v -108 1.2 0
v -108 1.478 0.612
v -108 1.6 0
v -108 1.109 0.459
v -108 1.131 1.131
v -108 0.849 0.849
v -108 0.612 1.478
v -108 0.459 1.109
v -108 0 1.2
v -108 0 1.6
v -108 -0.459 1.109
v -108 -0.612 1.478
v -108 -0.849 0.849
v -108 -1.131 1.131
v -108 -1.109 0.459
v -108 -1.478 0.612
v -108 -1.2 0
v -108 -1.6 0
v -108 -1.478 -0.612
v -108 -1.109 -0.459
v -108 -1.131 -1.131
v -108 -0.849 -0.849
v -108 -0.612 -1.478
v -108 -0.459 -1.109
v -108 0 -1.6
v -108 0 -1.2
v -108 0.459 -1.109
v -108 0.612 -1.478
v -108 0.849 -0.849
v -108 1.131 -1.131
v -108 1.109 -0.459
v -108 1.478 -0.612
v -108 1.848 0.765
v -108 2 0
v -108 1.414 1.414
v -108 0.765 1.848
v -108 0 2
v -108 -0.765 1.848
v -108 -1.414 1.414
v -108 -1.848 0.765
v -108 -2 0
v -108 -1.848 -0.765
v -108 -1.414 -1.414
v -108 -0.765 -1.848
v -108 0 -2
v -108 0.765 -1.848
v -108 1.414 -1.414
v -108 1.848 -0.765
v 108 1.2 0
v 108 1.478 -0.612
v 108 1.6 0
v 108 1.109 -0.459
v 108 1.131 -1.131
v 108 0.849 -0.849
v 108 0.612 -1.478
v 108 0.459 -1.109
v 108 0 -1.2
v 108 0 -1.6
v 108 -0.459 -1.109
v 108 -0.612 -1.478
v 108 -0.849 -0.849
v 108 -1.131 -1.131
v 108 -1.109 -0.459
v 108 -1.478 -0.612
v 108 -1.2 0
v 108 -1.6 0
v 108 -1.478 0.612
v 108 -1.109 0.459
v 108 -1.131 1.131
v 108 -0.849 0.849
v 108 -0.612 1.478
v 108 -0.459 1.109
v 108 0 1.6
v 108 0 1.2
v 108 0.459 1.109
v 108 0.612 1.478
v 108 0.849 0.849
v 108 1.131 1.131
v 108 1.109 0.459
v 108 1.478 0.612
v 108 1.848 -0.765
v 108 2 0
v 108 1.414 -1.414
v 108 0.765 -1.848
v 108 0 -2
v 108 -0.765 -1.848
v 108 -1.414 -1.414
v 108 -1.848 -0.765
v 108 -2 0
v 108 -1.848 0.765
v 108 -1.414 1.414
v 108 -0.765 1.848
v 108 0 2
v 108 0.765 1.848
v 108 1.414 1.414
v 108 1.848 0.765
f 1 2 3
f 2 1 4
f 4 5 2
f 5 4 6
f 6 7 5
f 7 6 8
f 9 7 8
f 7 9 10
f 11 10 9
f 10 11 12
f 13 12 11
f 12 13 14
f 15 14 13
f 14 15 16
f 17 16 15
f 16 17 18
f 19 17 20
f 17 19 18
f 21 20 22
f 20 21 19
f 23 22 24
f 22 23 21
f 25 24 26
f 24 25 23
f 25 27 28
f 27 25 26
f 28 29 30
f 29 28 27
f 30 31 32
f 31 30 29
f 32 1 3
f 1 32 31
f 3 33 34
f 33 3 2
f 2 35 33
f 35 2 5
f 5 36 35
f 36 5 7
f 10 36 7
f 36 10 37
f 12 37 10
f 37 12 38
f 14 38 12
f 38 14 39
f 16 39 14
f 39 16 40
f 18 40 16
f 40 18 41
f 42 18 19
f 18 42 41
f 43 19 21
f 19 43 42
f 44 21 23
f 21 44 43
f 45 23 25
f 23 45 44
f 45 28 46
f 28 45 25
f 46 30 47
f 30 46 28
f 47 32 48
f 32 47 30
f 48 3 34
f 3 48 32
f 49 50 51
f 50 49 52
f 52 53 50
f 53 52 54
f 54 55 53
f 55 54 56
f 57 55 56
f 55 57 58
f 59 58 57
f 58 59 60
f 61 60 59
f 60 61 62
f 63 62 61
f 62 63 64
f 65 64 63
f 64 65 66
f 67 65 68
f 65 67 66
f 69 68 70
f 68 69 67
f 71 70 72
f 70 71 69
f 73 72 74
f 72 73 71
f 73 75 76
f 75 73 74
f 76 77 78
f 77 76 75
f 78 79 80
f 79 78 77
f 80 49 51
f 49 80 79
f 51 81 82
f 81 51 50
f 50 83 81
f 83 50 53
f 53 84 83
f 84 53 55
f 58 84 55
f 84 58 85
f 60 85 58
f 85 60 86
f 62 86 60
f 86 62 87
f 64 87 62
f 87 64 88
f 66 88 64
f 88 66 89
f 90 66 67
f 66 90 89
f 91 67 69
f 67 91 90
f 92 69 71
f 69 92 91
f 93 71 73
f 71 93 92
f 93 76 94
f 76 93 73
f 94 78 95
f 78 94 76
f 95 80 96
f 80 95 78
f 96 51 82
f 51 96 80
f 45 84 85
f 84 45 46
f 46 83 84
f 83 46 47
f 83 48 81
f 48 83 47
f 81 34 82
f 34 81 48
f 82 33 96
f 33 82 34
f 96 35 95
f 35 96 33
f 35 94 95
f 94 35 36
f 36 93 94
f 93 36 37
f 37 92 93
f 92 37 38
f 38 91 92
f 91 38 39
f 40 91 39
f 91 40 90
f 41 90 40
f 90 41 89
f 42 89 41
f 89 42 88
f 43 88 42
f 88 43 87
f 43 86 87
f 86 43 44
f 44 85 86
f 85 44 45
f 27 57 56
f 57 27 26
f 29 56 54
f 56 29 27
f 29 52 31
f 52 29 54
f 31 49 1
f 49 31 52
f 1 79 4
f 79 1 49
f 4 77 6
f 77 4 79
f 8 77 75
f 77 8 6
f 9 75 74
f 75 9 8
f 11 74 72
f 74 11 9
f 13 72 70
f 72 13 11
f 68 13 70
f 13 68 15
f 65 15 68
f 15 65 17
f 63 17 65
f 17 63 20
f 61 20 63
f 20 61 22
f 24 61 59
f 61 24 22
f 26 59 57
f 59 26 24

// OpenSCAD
// file: ../p/4-4cyli.scad
use <../lib.scad>
function ldraw_lib__4_4cyli() = [
// 0 Cylinder 1.0
// 0 Name: 4-4cyli.dat
// 0 Author: James Jessiman
// 0 !LDRAW_ORG Primitive UPDATE 2005-01
// 0 !LICENSE Licensed under CC BY 2.0 and CC BY 4.0 : see CAreadme.txt
// 
// 0 BFC CERTIFY CCW
  [0,"BFC","CERTIFY"],
  [0,"BFC","CCW"],
// 
// 0 !HISTORY 1998-12-15 [PTadmin] Official Update 1998-10
// 0 !HISTORY 2002-03-23 [sbliss] Added BFC statement; merged headers from files in distributions LDraw 0.27 and Complete.
// 0 !HISTORY 2002-04-25 [PTadmin] Official Update 2002-02
// 0 !HISTORY 2004-12-14 [guyvivan] BFC CCW
// 0 !HISTORY 2005-12-28 [PTadmin] Official Update 2005-01
// 0 !HISTORY 2007-06-24 [PTadmin] Header formatted for Contributor Agreement
// 0 !HISTORY 2008-07-01 [PTadmin] Official Update 2008-01
// 
// 
// 4 16 1 1 0 0.9239 1 0.3827 0.9239 0 0.3827 1 0 0
  [4,16,1,1,0,0.9239,1,0.3827,0.9239,0,0.3827,1,0,0],
// 5 24 1 0 0 1 1 0 0.9239 0 0.3827 0.9239 0 -0.3827
  [5,24,1,0,0,1,1,0,0.9239,0,0.3827,0.9239,0,-0.3827],
// 4 16 0.9239 1 0.3827 0.7071 1 0.7071 0.7071 0 0.7071 0.9239 0 0.3827
  [4,16,0.9239,1,0.3827,0.7071,1,0.7071,0.7071,0,0.7071,0.9239,0,0.3827],
// 5 24 0.9239 0 0.3827 0.9239 1 0.3827 0.7071 0 0.7071 1 0 0
  [5,24,0.9239,0,0.3827,0.9239,1,0.3827,0.7071,0,0.7071,1,0,0],
// 4 16 0.7071 1 0.7071 0.3827 1 0.9239 0.3827 0 0.9239 0.7071 0 0.7071
  [4,16,0.7071,1,0.7071,0.3827,1,0.9239,0.3827,0,0.9239,0.7071,0,0.7071],
// 5 24 0.7071 0 0.7071 0.7071 1 0.7071 0.3827 0 0.9239 0.9239 0 0.3827
  [5,24,0.7071,0,0.7071,0.7071,1,0.7071,0.3827,0,0.9239,0.9239,0,0.3827],
// 4 16 0.3827 1 0.9239 0 1 1 0 0 1 0.3827 0 0.9239
  [4,16,0.3827,1,0.9239,0,1,1,0,0,1,0.3827,0,0.9239],
// 5 24 0.3827 0 0.9239 0.3827 1 0.9239 0 0 1 0.7071 0 0.7071
  [5,24,0.3827,0,0.9239,0.3827,1,0.9239,0,0,1,0.7071,0,0.7071],
// 4 16 0 1 1 -0.3827 1 0.9239 -0.3827 0 0.9239 0 0 1
  [4,16,0,1,1,-0.3827,1,0.9239,-0.3827,0,0.9239,0,0,1],
// 5 24 0 0 1 0 1 1 -0.3827 0 0.9239 0.3827 0 0.9239
  [5,24,0,0,1,0,1,1,-0.3827,0,0.9239,0.3827,0,0.9239],
// 4 16 -0.3827 1 0.9239 -0.7071 1 0.7071 -0.7071 0 0.7071 -0.3827 0 0.9239
  [4,16,-0.3827,1,0.9239,-0.7071,1,0.7071,-0.7071,0,0.7071,-0.3827,0,0.9239],
// 5 24 -0.3827 0 0.9239 -0.3827 1 0.9239 -0.7071 0 0.7071 0 0 1
  [5,24,-0.3827,0,0.9239,-0.3827,1,0.9239,-0.7071,0,0.7071,0,0,1],
// 4 16 -0.7071 1 0.7071 -0.9239 1 0.3827 -0.9239 0 0.3827 -0.7071 0 0.7071
  [4,16,-0.7071,1,0.7071,-0.9239,1,0.3827,-0.9239,0,0.3827,-0.7071,0,0.7071],
// 5 24 -0.7071 0 0.7071 -0.7071 1 0.7071 -0.9239 0 0.3827 -0.3827 0 0.9239
  [5,24,-0.7071,0,0.7071,-0.7071,1,0.7071,-0.9239,0,0.3827,-0.3827,0,0.9239],
// 4 16 -0.9239 1 0.3827 -1 1 0 -1 0 0 -0.9239 0 0.3827
  [4,16,-0.9239,1,0.3827,-1,1,0,-1,0,0,-0.9239,0,0.3827],
// 5 24 -0.9239 0 0.3827 -0.9239 1 0.3827 -1 0 0 -0.7071 0 0.7071
  [5,24,-0.9239,0,0.3827,-0.9239,1,0.3827,-1,0,0,-0.7071,0,0.7071],
// 4 16 -1 1 0 -0.9239 1 -0.3827 -0.9239 0 -0.3827 -1 0 0
  [4,16,-1,1,0,-0.9239,1,-0.3827,-0.9239,0,-0.3827,-1,0,0],
// 5 24 -1 0 0 -1 1 0 -0.9239 0 -0.3827 -0.9239 0 0.3827
  [5,24,-1,0,0,-1,1,0,-0.9239,0,-0.3827,-0.9239,0,0.3827],
// 4 16 -0.9239 1 -0.3827 -0.7071 1 -0.7071 -0.7071 0 -0.7071 -0.9239 0 -0.3827
  [4,16,-0.9239,1,-0.3827,-0.7071,1,-0.7071,-0.7071,0,-0.7071,-0.9239,0,-0.3827],
// 5 24 -0.9239 0 -0.3827 -0.9239 1 -0.3827 -0.7071 0 -0.7071 -1 0 0
  [5,24,-0.9239,0,-0.3827,-0.9239,1,-0.3827,-0.7071,0,-0.7071,-1,0,0],
// 4 16 -0.7071 1 -0.7071 -0.3827 1 -0.9239 -0.3827 0 -0.9239 -0.7071 0 -0.7071
  [4,16,-0.7071,1,-0.7071,-0.3827,1,-0.9239,-0.3827,0,-0.9239,-0.7071,0,-0.7071],
// 5 24 -0.7071 0 -0.7071 -0.7071 1 -0.7071 -0.3827 0 -0.9239 -0.9239 0 -0.3827
  [5,24,-0.7071,0,-0.7071,-0.7071,1,-0.7071,-0.3827,0,-0.9239,-0.9239,0,-0.3827],
// 4 16 -0.3827 1 -0.9239 0 1 -1 0 0 -1 -0.3827 0 -0.9239
  [4,16,-0.3827,1,-0.9239,0,1,-1,0,0,-1,-0.3827,0,-0.9239],
// 5 24 -0.3827 0 -0.9239 -0.3827 1 -0.9239 0 0 -1 -0.7071 0 -0.7071
  [5,24,-0.3827,0,-0.9239,-0.3827,1,-0.9239,0,0,-1,-0.7071,0,-0.7071],
// 4 16 0 1 -1 0.3827 1 -0.9239 0.3827 0 -0.9239 0 0 -1
  [4,16,0,1,-1,0.3827,1,-0.9239,0.3827,0,-0.9239,0,0,-1],
// 5 24 0 0 -1 0 1 -1 0.3827 0 -0.9239 -0.3827 0 -0.9239
  [5,24,0,0,-1,0,1,-1,0.3827,0,-0.9239,-0.3827,0,-0.9239],
// 4 16 0.3827 1 -0.9239 0.7071 1 -0.7071 0.7071 0 -0.7071 0.3827 0 -0.9239
  [4,16,0.3827,1,-0.9239,0.7071,1,-0.7071,0.7071,0,-0.7071,0.3827,0,-0.9239],
// 5 24 0.3827 0 -0.9239 0.3827 1 -0.9239 0.7071 0 -0.7071 0 0 -1
  [5,24,0.3827,0,-0.9239,0.3827,1,-0.9239,0.7071,0,-0.7071,0,0,-1],
// 4 16 0.7071 1 -0.7071 0.9239 1 -0.3827 0.9239 0 -0.3827 0.7071 0 -0.7071
  [4,16,0.7071,1,-0.7071,0.9239,1,-0.3827,0.9239,0,-0.3827,0.7071,0,-0.7071],
// 5 24 0.7071 0 -0.7071 0.7071 1 -0.7071 0.9239 0 -0.3827 0.3827 0 -0.9239
  [5,24,0.7071,0,-0.7071,0.7071,1,-0.7071,0.9239,0,-0.3827,0.3827,0,-0.9239],
// 4 16 0.9239 1 -0.3827 1 1 0 1 0 0 0.9239 0 -0.3827
  [4,16,0.9239,1,-0.3827,1,1,0,1,0,0,0.9239,0,-0.3827],
// 5 24 0.9239 0 -0.3827 0.9239 1 -0.3827 1 0 0 0.7071 0 -0.7071
  [5,24,0.9239,0,-0.3827,0.9239,1,-0.3827,1,0,0,0.7071,0,-0.7071],
// 0
];
module ldraw_lib__4_4cyli(step=0, col=false, unit=2/5, alt=false, line=0.2, solid=!$preview)
    makepoly(ldraw_lib__4_4cyli(), step=step, col=col, unit=unit, alt=alt, line=line, solid=solid);
ldraw_lib__4_4cyli(line=0.2);
// file: ../p/4-4ring4.scad
use <../lib.scad>
function ldraw_lib__4_4ring4() = [
// 0 Ring  4 x 1.0
// 0 Name: 4-4ring4.dat
// 0 Author: James Jessiman
// 0 !LDRAW_ORG Primitive UPDATE 2009-01
// 0 !LICENSE Licensed under CC BY 2.0 and CC BY 4.0 : see CAreadme.txt
// 
// 0 BFC CERTIFY CCW
  [0,"BFC","CERTIFY"],
  [0,"BFC","CCW"],
// 
// 0 !HISTORY 1998-12-15 [PTadmin] Official Update 1998-10
// 0 !HISTORY 2002-04-08 [BrickCaster] Modified for BFC compliance
// 0 !HISTORY 2002-04-25 [PTadmin] Official Update 2002-02
// 0 !HISTORY 2007-06-24 [PTadmin] Header formatted for Contributor Agreement
// 0 !HISTORY 2008-07-01 [PTadmin] Official Update 2008-01
// 0 !HISTORY 2008-08-26 [cwdee] Switch polygon winding and rename
// 0 !HISTORY 2009-05-02 [PTadmin] Official Update 2009-01
// 
// 
// 4 16 -1.9135 0 4.6195 -1.5308 0 3.6956 0 0 4 0 0 5
  [4,16,-1.9135,0,4.6195,-1.5308,0,3.6956,0,0,4,0,0,5],
// 4 16 -3.5355 0 3.5355 -2.8284 0 2.8284 -1.5308 0 3.6956 -1.9135 0 4.6195
  [4,16,-3.5355,0,3.5355,-2.8284,0,2.8284,-1.5308,0,3.6956,-1.9135,0,4.6195],
// 4 16 -4.6195 0 1.9135 -3.6956 0 1.5308 -2.8284 0 2.8284 -3.5355 0 3.5355
  [4,16,-4.6195,0,1.9135,-3.6956,0,1.5308,-2.8284,0,2.8284,-3.5355,0,3.5355],
// 4 16 -5 0 0 -4 0 0 -3.6956 0 1.5308 -4.6195 0 1.9135
  [4,16,-5,0,0,-4,0,0,-3.6956,0,1.5308,-4.6195,0,1.9135],
// 4 16 -4.6195 0 -1.9135 -3.6956 0 -1.5308 -4 0 0 -5 0 0
  [4,16,-4.6195,0,-1.9135,-3.6956,0,-1.5308,-4,0,0,-5,0,0],
// 4 16 -3.5355 0 -3.5355 -2.8284 0 -2.8284 -3.6956 0 -1.5308 -4.6195 0 -1.9135
  [4,16,-3.5355,0,-3.5355,-2.8284,0,-2.8284,-3.6956,0,-1.5308,-4.6195,0,-1.9135],
// 4 16 -1.9135 0 -4.6195 -1.5308 0 -3.6956 -2.8284 0 -2.8284 -3.5355 0 -3.5355
  [4,16,-1.9135,0,-4.6195,-1.5308,0,-3.6956,-2.8284,0,-2.8284,-3.5355,0,-3.5355],
// 4 16 0 0 -5 0 0 -4 -1.5308 0 -3.6956 -1.9135 0 -4.6195
  [4,16,0,0,-5,0,0,-4,-1.5308,0,-3.6956,-1.9135,0,-4.6195],
// 4 16 1.9135 0 -4.6195 1.5308 0 -3.6956 0 0 -4 0 0 -5
  [4,16,1.9135,0,-4.6195,1.5308,0,-3.6956,0,0,-4,0,0,-5],
// 4 16 3.5355 0 -3.5355 2.8284 0 -2.8284 1.5308 0 -3.6956 1.9135 0 -4.6195
  [4,16,3.5355,0,-3.5355,2.8284,0,-2.8284,1.5308,0,-3.6956,1.9135,0,-4.6195],
// 4 16 4.6195 0 -1.9135 3.6956 0 -1.5308 2.8284 0 -2.8284 3.5355 0 -3.5355
  [4,16,4.6195,0,-1.9135,3.6956,0,-1.5308,2.8284,0,-2.8284,3.5355,0,-3.5355],
// 4 16 5 0 0 4 0 0 3.6956 0 -1.5308 4.6195 0 -1.9135
  [4,16,5,0,0,4,0,0,3.6956,0,-1.5308,4.6195,0,-1.9135],
// 4 16 4.6195 0 1.9135 3.6956 0 1.5308 4 0 0 5 0 0
  [4,16,4.6195,0,1.9135,3.6956,0,1.5308,4,0,0,5,0,0],
// 4 16 3.5355 0 3.5355 2.8284 0 2.8284 3.6956 0 1.5308 4.6195 0 1.9135
  [4,16,3.5355,0,3.5355,2.8284,0,2.8284,3.6956,0,1.5308,4.6195,0,1.9135],
// 4 16 1.9135 0 4.6195 1.5308 0 3.6956 2.8284 0 2.8284 3.5355 0 3.5355
  [4,16,1.9135,0,4.6195,1.5308,0,3.6956,2.8284,0,2.8284,3.5355,0,3.5355],
// 4 16 0 0 5 0 0 4 1.5308 0 3.6956 1.9135 0 4.6195
  [4,16,0,0,5,0,0,4,1.5308,0,3.6956,1.9135,0,4.6195],
// 0
];
module ldraw_lib__4_4ring4(step=0, col=false, unit=2/5, alt=false, line=0.2, solid=!$preview)
    makepoly(ldraw_lib__4_4ring4(), step=step, col=col, unit=unit, alt=alt, line=line, solid=solid);
ldraw_lib__4_4ring4(line=0.2);
// file: ../p/4-4ring3.scad
use <../lib.scad>
function ldraw_lib__4_4ring3() = [
// 0 Ring  3 x 1.0
// 0 Name: 4-4ring3.dat
// 0 Author: James Jessiman
// 0 !LDRAW_ORG Primitive UPDATE 2009-01
// 0 !LICENSE Licensed under CC BY 2.0 and CC BY 4.0 : see CAreadme.txt
// 
// 0 BFC CERTIFY CCW
  [0,"BFC","CERTIFY"],
  [0,"BFC","CCW"],
// 
// 0 !HISTORY 1998-12-15 [PTadmin] Official Update 1998-10
// 0 !HISTORY 2002-04-05 [hafhead] Added BFC statement
// 0 !HISTORY 2002-04-25 [PTadmin] Official Update 2002-02
// 0 !HISTORY 2007-06-24 [PTadmin] Header formatted for Contributor Agreement
// 0 !HISTORY 2008-07-01 [PTadmin] Official Update 2008-01
// 0 !HISTORY 2008-08-26 [cwdee] Switch polygon winding and rename
// 0 !HISTORY 2009-05-02 [PTadmin] Official Update 2009-01
// 
// 
// 4 16 -1.5308 0 3.6956 -1.1481 0 2.7717 0 0 3 0 0 4
  [4,16,-1.5308,0,3.6956,-1.1481,0,2.7717,0,0,3,0,0,4],
// 4 16 -2.8284 0 2.8284 -2.1213 0 2.1213 -1.1481 0 2.7717 -1.5308 0 3.6956
  [4,16,-2.8284,0,2.8284,-2.1213,0,2.1213,-1.1481,0,2.7717,-1.5308,0,3.6956],
// 4 16 -3.6956 0 1.5308 -2.7717 0 1.1481 -2.1213 0 2.1213 -2.8284 0 2.8284
  [4,16,-3.6956,0,1.5308,-2.7717,0,1.1481,-2.1213,0,2.1213,-2.8284,0,2.8284],
// 4 16 -4 0 0 -3 0 0 -2.7717 0 1.1481 -3.6956 0 1.5308
  [4,16,-4,0,0,-3,0,0,-2.7717,0,1.1481,-3.6956,0,1.5308],
// 4 16 -3.6956 0 -1.5308 -2.7717 0 -1.1481 -3 0 0 -4 0 0
  [4,16,-3.6956,0,-1.5308,-2.7717,0,-1.1481,-3,0,0,-4,0,0],
// 4 16 -2.8284 0 -2.8284 -2.1213 0 -2.1213 -2.7717 0 -1.1481 -3.6956 0 -1.5308
  [4,16,-2.8284,0,-2.8284,-2.1213,0,-2.1213,-2.7717,0,-1.1481,-3.6956,0,-1.5308],
// 4 16 -1.5308 0 -3.6956 -1.1481 0 -2.7717 -2.1213 0 -2.1213 -2.8284 0 -2.8284
  [4,16,-1.5308,0,-3.6956,-1.1481,0,-2.7717,-2.1213,0,-2.1213,-2.8284,0,-2.8284],
// 4 16 0 0 -4 0 0 -3 -1.1481 0 -2.7717 -1.5308 0 -3.6956
  [4,16,0,0,-4,0,0,-3,-1.1481,0,-2.7717,-1.5308,0,-3.6956],
// 4 16 1.5308 0 -3.6956 1.1481 0 -2.7717 0 0 -3 0 0 -4
  [4,16,1.5308,0,-3.6956,1.1481,0,-2.7717,0,0,-3,0,0,-4],
// 4 16 2.8284 0 -2.8284 2.1213 0 -2.1213 1.1481 0 -2.7717 1.5308 0 -3.6956
  [4,16,2.8284,0,-2.8284,2.1213,0,-2.1213,1.1481,0,-2.7717,1.5308,0,-3.6956],
// 4 16 3.6956 0 -1.5308 2.7717 0 -1.1481 2.1213 0 -2.1213 2.8284 0 -2.8284
  [4,16,3.6956,0,-1.5308,2.7717,0,-1.1481,2.1213,0,-2.1213,2.8284,0,-2.8284],
// 4 16 4 0 0 3 0 0 2.7717 0 -1.1481 3.6956 0 -1.5308
  [4,16,4,0,0,3,0,0,2.7717,0,-1.1481,3.6956,0,-1.5308],
// 4 16 3.6956 0 1.5308 2.7717 0 1.1481 3 0 0 4 0 0
  [4,16,3.6956,0,1.5308,2.7717,0,1.1481,3,0,0,4,0,0],
// 4 16 2.8284 0 2.8284 2.1213 0 2.1213 2.7717 0 1.1481 3.6956 0 1.5308
  [4,16,2.8284,0,2.8284,2.1213,0,2.1213,2.7717,0,1.1481,3.6956,0,1.5308],
// 4 16 1.5308 0 3.6956 1.1481 0 2.7717 2.1213 0 2.1213 2.8284 0 2.8284
  [4,16,1.5308,0,3.6956,1.1481,0,2.7717,2.1213,0,2.1213,2.8284,0,2.8284],
// 4 16 0 0 4 0 0 3 1.1481 0 2.7717 1.5308 0 3.6956
  [4,16,0,0,4,0,0,3,1.1481,0,2.7717,1.5308,0,3.6956],
// 0
];
module ldraw_lib__4_4ring3(step=0, col=false, unit=2/5, alt=false, line=0.2, solid=!$preview)
    makepoly(ldraw_lib__4_4ring3(), step=step, col=col, unit=unit, alt=alt, line=line, solid=solid);
ldraw_lib__4_4ring3(line=0.2);
// file: ../p/4-4edge.scad
use <../lib.scad>
function ldraw_lib__4_4edge() = [
// 0 Circle 1.0
// 0 Name: 4-4edge.dat
// 0 Author: James Jessiman
// 0 !LDRAW_ORG Primitive UPDATE 2017-01
// 0 !LICENSE Licensed under CC BY 4.0 : see CAreadme.txt
// 
// 0 BFC CERTIFY CCW
  [0,"BFC","CERTIFY"],
  [0,"BFC","CCW"],
// 
// 0 !HISTORY 1998-12-15 [PTadmin] Official Update 1998-10
// 0 !HISTORY 2005-12-28 [PTadmin] Official Update 2005-01
// 0 !HISTORY 2007-06-24 [PTadmin] Header formatted for Contributor Agreement
// 0 !HISTORY 2008-07-01 [PTadmin] Official Update 2008-01
// 0 !HISTORY 2017-01-15 [Steffen] BFCed
// 0 !HISTORY 2017-12-30 [PTadmin] Official Update 2017-01
// 
// 
// 2 24 1 0 0 0.9239 0 0.3827
  [2,24,1,0,0,0.9239,0,0.3827],
// 2 24 0.9239 0 0.3827 0.7071 0 0.7071
  [2,24,0.9239,0,0.3827,0.7071,0,0.7071],
// 2 24 0.7071 0 0.7071 0.3827 0 0.9239
  [2,24,0.7071,0,0.7071,0.3827,0,0.9239],
// 2 24 0.3827 0 0.9239 0 0 1
  [2,24,0.3827,0,0.9239,0,0,1],
// 2 24 0 0 1 -0.3827 0 0.9239
  [2,24,0,0,1,-0.3827,0,0.9239],
// 2 24 -0.3827 0 0.9239 -0.7071 0 0.7071
  [2,24,-0.3827,0,0.9239,-0.7071,0,0.7071],
// 2 24 -0.7071 0 0.7071 -0.9239 0 0.3827
  [2,24,-0.7071,0,0.7071,-0.9239,0,0.3827],
// 2 24 -0.9239 0 0.3827 -1 0 -0
  [2,24,-0.9239,0,0.3827,-1,0,-0],
// 2 24 -1 0 -0 -0.9239 0 -0.3827
  [2,24,-1,0,-0,-0.9239,0,-0.3827],
// 2 24 -0.9239 0 -0.3827 -0.7071 0 -0.7071
  [2,24,-0.9239,0,-0.3827,-0.7071,0,-0.7071],
// 2 24 -0.7071 0 -0.7071 -0.3827 0 -0.9239
  [2,24,-0.7071,0,-0.7071,-0.3827,0,-0.9239],
// 2 24 -0.3827 0 -0.9239 0 0 -1
  [2,24,-0.3827,0,-0.9239,0,0,-1],
// 2 24 0 0 -1 0.3827 0 -0.9239
  [2,24,0,0,-1,0.3827,0,-0.9239],
// 2 24 0.3827 0 -0.9239 0.7071 0 -0.7071
  [2,24,0.3827,0,-0.9239,0.7071,0,-0.7071],
// 2 24 0.7071 0 -0.7071 0.9239 0 -0.3827
  [2,24,0.7071,0,-0.7071,0.9239,0,-0.3827],
// 2 24 0.9239 0 -0.3827 1 0 0
  [2,24,0.9239,0,-0.3827,1,0,0],
];
module ldraw_lib__4_4edge(step=0, col=false, unit=2/5, alt=false, line=0.2, solid=!$preview)
    makepoly(ldraw_lib__4_4edge(), step=step, col=col, unit=unit, alt=alt, line=line, solid=solid);
ldraw_lib__4_4edge(line=0.2);
// file: 71533k03.scad
use <../lib.scad>
use <../p/4-4cyli.scad>
function ldraw_lib__71533k03() = [
// 0 ~Technic Pneumatic Tube Segment
// 0 Name: 71533k03.dat
// 0 Author: Jaco van der Molen [Jaco]
// 0 !LDRAW_ORG Part Flexible_Section UPDATE 2020-01
// 0 !LICENSE Licensed under CC BY 4.0 : see CAreadme.txt
// 
// 0 BFC CERTIFY CW
  [0,"BFC","CERTIFY"],
  [0,"BFC","CW"],
// 
// 0 !HISTORY 2003-11-30 [Steffen] BFCed
// 0 !HISTORY 2009-12-29 [PTadmin] Official Update 2009-03
// 0 !HISTORY 2020-06-27 [PTadmin] Renamed from 166
// 0 !HISTORY 2020-06-28 [PTadmin] Official Update 2020-01
// 
// 
// 1 16 0 0 0 5 0 0 0 1 0 0 0 5 4-4cyli.dat
  [1,16,0,0,0,5,0,0,0,1,0,0,0,5, ldraw_lib__4_4cyli()],
// 0 BFC INVERTNEXT
  [0,"BFC","INVERTNEXT"],
// 1 16 0 0 0 3 0 0 0 1 0 0 0 3 4-4cyli.dat
  [1,16,0,0,0,3,0,0,0,1,0,0,0,3, ldraw_lib__4_4cyli()],
// 0
];
module ldraw_lib__71533k03(step=0, col=false, unit=2/5, alt=false, line=0.2, solid=!$preview)
    makepoly(ldraw_lib__71533k03(), step=step, col=col, unit=unit, alt=alt, line=line, solid=solid);
ldraw_lib__71533k03(line=0.2);
// file: 71533k02.scad
use <../lib.scad>
use <../p/4-4edge.scad>
use <../p/4-4ring3.scad>
use <../p/4-4ring4.scad>
function ldraw_lib__71533k02() = [
// 0 ~Technic Pneumatic Tube End (Non-Bulged)
// 0 Name: 71533k02.dat
// 0 Author: Steffen [Steffen]
// 0 !LDRAW_ORG Part Flexible_Section UPDATE 2020-01
// 0 !LICENSE Licensed under CC BY 4.0 : see CAreadme.txt
// 
// 0 BFC CERTIFY CCW
  [0,"BFC","CERTIFY"],
  [0,"BFC","CCW"],
// 
// 0 !HISTORY 2020-06-28 [PTadmin] Official Update 2020-01
// 
// 
// 0 // This file goes together with 71533k01.dat and 71533k03.dat.
// 0 // Those 3 files can be used to create Technic Pneumatic Tubes
// 0 // with either bulged or non-bulged ends.
// 
// 1 16 0 0 0 1 0 0 0 1 0 0 0 1 4-4ring3.dat
  [1,16,0,0,0,1,0,0,0,1,0,0,0,1, ldraw_lib__4_4ring3()],
// 1 16 0 0 0 1 0 0 0 1 0 0 0 1 4-4ring4.dat
  [1,16,0,0,0,1,0,0,0,1,0,0,0,1, ldraw_lib__4_4ring4()],
// 1 16 0 0 0 3 0 0 0 3 0 0 0 3 4-4edge.dat
  [1,16,0,0,0,3,0,0,0,3,0,0,0,3, ldraw_lib__4_4edge()],
// 1 16 0 0 0 5 0 0 0 5 0 0 0 5 4-4edge.dat
  [1,16,0,0,0,5,0,0,0,5,0,0,0,5, ldraw_lib__4_4edge()],
];
module ldraw_lib__71533k02(step=0, col=false, unit=2/5, alt=false, line=0.2, solid=!$preview)
    makepoly(ldraw_lib__71533k02(), step=step, col=col, unit=unit, alt=alt, line=line, solid=solid);
ldraw_lib__71533k02(line=0.2);
// main file
use <../lib.scad>
use <71533k02.scad>
use <71533k03.scad>
function ldraw_lib__21830_f1() = [
// 0 Technic Pneumatic Tube 27L
// 0 Name: 21830-f1.dat
// 0 Author: Philippe Hurbain [Philo]
// 0 !LDRAW_ORG Part UPDATE 2020-02
// 0 !LICENSE Licensed under CC BY 4.0 : see CAreadme.txt
// 
// 0 BFC CERTIFY CCW
  [0,"BFC","CERTIFY"],
  [0,"BFC","CCW"],
// 
// 0 !KEYWORDS 216 mm
// 
// 0 !HISTORY 2020-09-05 [PTadmin] Official Update 2020-02
// 
// 
// 1 16 -270 0 0 0 1 0 1 0 0 0 0 1 71533k02.dat
  [1,16,-270,0,0,0,1,0,1,0,0,0,0,1, ldraw_lib__71533k02()],
// 1 16 270 0 0 0 -1 0 -1 0 0 0 0 1 71533k02.dat
  [1,16,270,0,0,0,-1,0,-1,0,0,0,0,1, ldraw_lib__71533k02()],
// 1 16 -270 0 0 0 540 0 1 0 0 0 0 1 71533k03.dat
  [1,16,-270,0,0,0,540,0,1,0,0,0,0,1, ldraw_lib__71533k03()],
];
module ldraw_lib__21830_f1(step=0, col=false, unit=2/5, alt=false, line=0.2, solid=!$preview)
    makepoly(ldraw_lib__21830_f1(), step=step, col=col, unit=unit, alt=alt, line=line, solid=solid);
ldraw_lib__21830_f1(line=0.2);
